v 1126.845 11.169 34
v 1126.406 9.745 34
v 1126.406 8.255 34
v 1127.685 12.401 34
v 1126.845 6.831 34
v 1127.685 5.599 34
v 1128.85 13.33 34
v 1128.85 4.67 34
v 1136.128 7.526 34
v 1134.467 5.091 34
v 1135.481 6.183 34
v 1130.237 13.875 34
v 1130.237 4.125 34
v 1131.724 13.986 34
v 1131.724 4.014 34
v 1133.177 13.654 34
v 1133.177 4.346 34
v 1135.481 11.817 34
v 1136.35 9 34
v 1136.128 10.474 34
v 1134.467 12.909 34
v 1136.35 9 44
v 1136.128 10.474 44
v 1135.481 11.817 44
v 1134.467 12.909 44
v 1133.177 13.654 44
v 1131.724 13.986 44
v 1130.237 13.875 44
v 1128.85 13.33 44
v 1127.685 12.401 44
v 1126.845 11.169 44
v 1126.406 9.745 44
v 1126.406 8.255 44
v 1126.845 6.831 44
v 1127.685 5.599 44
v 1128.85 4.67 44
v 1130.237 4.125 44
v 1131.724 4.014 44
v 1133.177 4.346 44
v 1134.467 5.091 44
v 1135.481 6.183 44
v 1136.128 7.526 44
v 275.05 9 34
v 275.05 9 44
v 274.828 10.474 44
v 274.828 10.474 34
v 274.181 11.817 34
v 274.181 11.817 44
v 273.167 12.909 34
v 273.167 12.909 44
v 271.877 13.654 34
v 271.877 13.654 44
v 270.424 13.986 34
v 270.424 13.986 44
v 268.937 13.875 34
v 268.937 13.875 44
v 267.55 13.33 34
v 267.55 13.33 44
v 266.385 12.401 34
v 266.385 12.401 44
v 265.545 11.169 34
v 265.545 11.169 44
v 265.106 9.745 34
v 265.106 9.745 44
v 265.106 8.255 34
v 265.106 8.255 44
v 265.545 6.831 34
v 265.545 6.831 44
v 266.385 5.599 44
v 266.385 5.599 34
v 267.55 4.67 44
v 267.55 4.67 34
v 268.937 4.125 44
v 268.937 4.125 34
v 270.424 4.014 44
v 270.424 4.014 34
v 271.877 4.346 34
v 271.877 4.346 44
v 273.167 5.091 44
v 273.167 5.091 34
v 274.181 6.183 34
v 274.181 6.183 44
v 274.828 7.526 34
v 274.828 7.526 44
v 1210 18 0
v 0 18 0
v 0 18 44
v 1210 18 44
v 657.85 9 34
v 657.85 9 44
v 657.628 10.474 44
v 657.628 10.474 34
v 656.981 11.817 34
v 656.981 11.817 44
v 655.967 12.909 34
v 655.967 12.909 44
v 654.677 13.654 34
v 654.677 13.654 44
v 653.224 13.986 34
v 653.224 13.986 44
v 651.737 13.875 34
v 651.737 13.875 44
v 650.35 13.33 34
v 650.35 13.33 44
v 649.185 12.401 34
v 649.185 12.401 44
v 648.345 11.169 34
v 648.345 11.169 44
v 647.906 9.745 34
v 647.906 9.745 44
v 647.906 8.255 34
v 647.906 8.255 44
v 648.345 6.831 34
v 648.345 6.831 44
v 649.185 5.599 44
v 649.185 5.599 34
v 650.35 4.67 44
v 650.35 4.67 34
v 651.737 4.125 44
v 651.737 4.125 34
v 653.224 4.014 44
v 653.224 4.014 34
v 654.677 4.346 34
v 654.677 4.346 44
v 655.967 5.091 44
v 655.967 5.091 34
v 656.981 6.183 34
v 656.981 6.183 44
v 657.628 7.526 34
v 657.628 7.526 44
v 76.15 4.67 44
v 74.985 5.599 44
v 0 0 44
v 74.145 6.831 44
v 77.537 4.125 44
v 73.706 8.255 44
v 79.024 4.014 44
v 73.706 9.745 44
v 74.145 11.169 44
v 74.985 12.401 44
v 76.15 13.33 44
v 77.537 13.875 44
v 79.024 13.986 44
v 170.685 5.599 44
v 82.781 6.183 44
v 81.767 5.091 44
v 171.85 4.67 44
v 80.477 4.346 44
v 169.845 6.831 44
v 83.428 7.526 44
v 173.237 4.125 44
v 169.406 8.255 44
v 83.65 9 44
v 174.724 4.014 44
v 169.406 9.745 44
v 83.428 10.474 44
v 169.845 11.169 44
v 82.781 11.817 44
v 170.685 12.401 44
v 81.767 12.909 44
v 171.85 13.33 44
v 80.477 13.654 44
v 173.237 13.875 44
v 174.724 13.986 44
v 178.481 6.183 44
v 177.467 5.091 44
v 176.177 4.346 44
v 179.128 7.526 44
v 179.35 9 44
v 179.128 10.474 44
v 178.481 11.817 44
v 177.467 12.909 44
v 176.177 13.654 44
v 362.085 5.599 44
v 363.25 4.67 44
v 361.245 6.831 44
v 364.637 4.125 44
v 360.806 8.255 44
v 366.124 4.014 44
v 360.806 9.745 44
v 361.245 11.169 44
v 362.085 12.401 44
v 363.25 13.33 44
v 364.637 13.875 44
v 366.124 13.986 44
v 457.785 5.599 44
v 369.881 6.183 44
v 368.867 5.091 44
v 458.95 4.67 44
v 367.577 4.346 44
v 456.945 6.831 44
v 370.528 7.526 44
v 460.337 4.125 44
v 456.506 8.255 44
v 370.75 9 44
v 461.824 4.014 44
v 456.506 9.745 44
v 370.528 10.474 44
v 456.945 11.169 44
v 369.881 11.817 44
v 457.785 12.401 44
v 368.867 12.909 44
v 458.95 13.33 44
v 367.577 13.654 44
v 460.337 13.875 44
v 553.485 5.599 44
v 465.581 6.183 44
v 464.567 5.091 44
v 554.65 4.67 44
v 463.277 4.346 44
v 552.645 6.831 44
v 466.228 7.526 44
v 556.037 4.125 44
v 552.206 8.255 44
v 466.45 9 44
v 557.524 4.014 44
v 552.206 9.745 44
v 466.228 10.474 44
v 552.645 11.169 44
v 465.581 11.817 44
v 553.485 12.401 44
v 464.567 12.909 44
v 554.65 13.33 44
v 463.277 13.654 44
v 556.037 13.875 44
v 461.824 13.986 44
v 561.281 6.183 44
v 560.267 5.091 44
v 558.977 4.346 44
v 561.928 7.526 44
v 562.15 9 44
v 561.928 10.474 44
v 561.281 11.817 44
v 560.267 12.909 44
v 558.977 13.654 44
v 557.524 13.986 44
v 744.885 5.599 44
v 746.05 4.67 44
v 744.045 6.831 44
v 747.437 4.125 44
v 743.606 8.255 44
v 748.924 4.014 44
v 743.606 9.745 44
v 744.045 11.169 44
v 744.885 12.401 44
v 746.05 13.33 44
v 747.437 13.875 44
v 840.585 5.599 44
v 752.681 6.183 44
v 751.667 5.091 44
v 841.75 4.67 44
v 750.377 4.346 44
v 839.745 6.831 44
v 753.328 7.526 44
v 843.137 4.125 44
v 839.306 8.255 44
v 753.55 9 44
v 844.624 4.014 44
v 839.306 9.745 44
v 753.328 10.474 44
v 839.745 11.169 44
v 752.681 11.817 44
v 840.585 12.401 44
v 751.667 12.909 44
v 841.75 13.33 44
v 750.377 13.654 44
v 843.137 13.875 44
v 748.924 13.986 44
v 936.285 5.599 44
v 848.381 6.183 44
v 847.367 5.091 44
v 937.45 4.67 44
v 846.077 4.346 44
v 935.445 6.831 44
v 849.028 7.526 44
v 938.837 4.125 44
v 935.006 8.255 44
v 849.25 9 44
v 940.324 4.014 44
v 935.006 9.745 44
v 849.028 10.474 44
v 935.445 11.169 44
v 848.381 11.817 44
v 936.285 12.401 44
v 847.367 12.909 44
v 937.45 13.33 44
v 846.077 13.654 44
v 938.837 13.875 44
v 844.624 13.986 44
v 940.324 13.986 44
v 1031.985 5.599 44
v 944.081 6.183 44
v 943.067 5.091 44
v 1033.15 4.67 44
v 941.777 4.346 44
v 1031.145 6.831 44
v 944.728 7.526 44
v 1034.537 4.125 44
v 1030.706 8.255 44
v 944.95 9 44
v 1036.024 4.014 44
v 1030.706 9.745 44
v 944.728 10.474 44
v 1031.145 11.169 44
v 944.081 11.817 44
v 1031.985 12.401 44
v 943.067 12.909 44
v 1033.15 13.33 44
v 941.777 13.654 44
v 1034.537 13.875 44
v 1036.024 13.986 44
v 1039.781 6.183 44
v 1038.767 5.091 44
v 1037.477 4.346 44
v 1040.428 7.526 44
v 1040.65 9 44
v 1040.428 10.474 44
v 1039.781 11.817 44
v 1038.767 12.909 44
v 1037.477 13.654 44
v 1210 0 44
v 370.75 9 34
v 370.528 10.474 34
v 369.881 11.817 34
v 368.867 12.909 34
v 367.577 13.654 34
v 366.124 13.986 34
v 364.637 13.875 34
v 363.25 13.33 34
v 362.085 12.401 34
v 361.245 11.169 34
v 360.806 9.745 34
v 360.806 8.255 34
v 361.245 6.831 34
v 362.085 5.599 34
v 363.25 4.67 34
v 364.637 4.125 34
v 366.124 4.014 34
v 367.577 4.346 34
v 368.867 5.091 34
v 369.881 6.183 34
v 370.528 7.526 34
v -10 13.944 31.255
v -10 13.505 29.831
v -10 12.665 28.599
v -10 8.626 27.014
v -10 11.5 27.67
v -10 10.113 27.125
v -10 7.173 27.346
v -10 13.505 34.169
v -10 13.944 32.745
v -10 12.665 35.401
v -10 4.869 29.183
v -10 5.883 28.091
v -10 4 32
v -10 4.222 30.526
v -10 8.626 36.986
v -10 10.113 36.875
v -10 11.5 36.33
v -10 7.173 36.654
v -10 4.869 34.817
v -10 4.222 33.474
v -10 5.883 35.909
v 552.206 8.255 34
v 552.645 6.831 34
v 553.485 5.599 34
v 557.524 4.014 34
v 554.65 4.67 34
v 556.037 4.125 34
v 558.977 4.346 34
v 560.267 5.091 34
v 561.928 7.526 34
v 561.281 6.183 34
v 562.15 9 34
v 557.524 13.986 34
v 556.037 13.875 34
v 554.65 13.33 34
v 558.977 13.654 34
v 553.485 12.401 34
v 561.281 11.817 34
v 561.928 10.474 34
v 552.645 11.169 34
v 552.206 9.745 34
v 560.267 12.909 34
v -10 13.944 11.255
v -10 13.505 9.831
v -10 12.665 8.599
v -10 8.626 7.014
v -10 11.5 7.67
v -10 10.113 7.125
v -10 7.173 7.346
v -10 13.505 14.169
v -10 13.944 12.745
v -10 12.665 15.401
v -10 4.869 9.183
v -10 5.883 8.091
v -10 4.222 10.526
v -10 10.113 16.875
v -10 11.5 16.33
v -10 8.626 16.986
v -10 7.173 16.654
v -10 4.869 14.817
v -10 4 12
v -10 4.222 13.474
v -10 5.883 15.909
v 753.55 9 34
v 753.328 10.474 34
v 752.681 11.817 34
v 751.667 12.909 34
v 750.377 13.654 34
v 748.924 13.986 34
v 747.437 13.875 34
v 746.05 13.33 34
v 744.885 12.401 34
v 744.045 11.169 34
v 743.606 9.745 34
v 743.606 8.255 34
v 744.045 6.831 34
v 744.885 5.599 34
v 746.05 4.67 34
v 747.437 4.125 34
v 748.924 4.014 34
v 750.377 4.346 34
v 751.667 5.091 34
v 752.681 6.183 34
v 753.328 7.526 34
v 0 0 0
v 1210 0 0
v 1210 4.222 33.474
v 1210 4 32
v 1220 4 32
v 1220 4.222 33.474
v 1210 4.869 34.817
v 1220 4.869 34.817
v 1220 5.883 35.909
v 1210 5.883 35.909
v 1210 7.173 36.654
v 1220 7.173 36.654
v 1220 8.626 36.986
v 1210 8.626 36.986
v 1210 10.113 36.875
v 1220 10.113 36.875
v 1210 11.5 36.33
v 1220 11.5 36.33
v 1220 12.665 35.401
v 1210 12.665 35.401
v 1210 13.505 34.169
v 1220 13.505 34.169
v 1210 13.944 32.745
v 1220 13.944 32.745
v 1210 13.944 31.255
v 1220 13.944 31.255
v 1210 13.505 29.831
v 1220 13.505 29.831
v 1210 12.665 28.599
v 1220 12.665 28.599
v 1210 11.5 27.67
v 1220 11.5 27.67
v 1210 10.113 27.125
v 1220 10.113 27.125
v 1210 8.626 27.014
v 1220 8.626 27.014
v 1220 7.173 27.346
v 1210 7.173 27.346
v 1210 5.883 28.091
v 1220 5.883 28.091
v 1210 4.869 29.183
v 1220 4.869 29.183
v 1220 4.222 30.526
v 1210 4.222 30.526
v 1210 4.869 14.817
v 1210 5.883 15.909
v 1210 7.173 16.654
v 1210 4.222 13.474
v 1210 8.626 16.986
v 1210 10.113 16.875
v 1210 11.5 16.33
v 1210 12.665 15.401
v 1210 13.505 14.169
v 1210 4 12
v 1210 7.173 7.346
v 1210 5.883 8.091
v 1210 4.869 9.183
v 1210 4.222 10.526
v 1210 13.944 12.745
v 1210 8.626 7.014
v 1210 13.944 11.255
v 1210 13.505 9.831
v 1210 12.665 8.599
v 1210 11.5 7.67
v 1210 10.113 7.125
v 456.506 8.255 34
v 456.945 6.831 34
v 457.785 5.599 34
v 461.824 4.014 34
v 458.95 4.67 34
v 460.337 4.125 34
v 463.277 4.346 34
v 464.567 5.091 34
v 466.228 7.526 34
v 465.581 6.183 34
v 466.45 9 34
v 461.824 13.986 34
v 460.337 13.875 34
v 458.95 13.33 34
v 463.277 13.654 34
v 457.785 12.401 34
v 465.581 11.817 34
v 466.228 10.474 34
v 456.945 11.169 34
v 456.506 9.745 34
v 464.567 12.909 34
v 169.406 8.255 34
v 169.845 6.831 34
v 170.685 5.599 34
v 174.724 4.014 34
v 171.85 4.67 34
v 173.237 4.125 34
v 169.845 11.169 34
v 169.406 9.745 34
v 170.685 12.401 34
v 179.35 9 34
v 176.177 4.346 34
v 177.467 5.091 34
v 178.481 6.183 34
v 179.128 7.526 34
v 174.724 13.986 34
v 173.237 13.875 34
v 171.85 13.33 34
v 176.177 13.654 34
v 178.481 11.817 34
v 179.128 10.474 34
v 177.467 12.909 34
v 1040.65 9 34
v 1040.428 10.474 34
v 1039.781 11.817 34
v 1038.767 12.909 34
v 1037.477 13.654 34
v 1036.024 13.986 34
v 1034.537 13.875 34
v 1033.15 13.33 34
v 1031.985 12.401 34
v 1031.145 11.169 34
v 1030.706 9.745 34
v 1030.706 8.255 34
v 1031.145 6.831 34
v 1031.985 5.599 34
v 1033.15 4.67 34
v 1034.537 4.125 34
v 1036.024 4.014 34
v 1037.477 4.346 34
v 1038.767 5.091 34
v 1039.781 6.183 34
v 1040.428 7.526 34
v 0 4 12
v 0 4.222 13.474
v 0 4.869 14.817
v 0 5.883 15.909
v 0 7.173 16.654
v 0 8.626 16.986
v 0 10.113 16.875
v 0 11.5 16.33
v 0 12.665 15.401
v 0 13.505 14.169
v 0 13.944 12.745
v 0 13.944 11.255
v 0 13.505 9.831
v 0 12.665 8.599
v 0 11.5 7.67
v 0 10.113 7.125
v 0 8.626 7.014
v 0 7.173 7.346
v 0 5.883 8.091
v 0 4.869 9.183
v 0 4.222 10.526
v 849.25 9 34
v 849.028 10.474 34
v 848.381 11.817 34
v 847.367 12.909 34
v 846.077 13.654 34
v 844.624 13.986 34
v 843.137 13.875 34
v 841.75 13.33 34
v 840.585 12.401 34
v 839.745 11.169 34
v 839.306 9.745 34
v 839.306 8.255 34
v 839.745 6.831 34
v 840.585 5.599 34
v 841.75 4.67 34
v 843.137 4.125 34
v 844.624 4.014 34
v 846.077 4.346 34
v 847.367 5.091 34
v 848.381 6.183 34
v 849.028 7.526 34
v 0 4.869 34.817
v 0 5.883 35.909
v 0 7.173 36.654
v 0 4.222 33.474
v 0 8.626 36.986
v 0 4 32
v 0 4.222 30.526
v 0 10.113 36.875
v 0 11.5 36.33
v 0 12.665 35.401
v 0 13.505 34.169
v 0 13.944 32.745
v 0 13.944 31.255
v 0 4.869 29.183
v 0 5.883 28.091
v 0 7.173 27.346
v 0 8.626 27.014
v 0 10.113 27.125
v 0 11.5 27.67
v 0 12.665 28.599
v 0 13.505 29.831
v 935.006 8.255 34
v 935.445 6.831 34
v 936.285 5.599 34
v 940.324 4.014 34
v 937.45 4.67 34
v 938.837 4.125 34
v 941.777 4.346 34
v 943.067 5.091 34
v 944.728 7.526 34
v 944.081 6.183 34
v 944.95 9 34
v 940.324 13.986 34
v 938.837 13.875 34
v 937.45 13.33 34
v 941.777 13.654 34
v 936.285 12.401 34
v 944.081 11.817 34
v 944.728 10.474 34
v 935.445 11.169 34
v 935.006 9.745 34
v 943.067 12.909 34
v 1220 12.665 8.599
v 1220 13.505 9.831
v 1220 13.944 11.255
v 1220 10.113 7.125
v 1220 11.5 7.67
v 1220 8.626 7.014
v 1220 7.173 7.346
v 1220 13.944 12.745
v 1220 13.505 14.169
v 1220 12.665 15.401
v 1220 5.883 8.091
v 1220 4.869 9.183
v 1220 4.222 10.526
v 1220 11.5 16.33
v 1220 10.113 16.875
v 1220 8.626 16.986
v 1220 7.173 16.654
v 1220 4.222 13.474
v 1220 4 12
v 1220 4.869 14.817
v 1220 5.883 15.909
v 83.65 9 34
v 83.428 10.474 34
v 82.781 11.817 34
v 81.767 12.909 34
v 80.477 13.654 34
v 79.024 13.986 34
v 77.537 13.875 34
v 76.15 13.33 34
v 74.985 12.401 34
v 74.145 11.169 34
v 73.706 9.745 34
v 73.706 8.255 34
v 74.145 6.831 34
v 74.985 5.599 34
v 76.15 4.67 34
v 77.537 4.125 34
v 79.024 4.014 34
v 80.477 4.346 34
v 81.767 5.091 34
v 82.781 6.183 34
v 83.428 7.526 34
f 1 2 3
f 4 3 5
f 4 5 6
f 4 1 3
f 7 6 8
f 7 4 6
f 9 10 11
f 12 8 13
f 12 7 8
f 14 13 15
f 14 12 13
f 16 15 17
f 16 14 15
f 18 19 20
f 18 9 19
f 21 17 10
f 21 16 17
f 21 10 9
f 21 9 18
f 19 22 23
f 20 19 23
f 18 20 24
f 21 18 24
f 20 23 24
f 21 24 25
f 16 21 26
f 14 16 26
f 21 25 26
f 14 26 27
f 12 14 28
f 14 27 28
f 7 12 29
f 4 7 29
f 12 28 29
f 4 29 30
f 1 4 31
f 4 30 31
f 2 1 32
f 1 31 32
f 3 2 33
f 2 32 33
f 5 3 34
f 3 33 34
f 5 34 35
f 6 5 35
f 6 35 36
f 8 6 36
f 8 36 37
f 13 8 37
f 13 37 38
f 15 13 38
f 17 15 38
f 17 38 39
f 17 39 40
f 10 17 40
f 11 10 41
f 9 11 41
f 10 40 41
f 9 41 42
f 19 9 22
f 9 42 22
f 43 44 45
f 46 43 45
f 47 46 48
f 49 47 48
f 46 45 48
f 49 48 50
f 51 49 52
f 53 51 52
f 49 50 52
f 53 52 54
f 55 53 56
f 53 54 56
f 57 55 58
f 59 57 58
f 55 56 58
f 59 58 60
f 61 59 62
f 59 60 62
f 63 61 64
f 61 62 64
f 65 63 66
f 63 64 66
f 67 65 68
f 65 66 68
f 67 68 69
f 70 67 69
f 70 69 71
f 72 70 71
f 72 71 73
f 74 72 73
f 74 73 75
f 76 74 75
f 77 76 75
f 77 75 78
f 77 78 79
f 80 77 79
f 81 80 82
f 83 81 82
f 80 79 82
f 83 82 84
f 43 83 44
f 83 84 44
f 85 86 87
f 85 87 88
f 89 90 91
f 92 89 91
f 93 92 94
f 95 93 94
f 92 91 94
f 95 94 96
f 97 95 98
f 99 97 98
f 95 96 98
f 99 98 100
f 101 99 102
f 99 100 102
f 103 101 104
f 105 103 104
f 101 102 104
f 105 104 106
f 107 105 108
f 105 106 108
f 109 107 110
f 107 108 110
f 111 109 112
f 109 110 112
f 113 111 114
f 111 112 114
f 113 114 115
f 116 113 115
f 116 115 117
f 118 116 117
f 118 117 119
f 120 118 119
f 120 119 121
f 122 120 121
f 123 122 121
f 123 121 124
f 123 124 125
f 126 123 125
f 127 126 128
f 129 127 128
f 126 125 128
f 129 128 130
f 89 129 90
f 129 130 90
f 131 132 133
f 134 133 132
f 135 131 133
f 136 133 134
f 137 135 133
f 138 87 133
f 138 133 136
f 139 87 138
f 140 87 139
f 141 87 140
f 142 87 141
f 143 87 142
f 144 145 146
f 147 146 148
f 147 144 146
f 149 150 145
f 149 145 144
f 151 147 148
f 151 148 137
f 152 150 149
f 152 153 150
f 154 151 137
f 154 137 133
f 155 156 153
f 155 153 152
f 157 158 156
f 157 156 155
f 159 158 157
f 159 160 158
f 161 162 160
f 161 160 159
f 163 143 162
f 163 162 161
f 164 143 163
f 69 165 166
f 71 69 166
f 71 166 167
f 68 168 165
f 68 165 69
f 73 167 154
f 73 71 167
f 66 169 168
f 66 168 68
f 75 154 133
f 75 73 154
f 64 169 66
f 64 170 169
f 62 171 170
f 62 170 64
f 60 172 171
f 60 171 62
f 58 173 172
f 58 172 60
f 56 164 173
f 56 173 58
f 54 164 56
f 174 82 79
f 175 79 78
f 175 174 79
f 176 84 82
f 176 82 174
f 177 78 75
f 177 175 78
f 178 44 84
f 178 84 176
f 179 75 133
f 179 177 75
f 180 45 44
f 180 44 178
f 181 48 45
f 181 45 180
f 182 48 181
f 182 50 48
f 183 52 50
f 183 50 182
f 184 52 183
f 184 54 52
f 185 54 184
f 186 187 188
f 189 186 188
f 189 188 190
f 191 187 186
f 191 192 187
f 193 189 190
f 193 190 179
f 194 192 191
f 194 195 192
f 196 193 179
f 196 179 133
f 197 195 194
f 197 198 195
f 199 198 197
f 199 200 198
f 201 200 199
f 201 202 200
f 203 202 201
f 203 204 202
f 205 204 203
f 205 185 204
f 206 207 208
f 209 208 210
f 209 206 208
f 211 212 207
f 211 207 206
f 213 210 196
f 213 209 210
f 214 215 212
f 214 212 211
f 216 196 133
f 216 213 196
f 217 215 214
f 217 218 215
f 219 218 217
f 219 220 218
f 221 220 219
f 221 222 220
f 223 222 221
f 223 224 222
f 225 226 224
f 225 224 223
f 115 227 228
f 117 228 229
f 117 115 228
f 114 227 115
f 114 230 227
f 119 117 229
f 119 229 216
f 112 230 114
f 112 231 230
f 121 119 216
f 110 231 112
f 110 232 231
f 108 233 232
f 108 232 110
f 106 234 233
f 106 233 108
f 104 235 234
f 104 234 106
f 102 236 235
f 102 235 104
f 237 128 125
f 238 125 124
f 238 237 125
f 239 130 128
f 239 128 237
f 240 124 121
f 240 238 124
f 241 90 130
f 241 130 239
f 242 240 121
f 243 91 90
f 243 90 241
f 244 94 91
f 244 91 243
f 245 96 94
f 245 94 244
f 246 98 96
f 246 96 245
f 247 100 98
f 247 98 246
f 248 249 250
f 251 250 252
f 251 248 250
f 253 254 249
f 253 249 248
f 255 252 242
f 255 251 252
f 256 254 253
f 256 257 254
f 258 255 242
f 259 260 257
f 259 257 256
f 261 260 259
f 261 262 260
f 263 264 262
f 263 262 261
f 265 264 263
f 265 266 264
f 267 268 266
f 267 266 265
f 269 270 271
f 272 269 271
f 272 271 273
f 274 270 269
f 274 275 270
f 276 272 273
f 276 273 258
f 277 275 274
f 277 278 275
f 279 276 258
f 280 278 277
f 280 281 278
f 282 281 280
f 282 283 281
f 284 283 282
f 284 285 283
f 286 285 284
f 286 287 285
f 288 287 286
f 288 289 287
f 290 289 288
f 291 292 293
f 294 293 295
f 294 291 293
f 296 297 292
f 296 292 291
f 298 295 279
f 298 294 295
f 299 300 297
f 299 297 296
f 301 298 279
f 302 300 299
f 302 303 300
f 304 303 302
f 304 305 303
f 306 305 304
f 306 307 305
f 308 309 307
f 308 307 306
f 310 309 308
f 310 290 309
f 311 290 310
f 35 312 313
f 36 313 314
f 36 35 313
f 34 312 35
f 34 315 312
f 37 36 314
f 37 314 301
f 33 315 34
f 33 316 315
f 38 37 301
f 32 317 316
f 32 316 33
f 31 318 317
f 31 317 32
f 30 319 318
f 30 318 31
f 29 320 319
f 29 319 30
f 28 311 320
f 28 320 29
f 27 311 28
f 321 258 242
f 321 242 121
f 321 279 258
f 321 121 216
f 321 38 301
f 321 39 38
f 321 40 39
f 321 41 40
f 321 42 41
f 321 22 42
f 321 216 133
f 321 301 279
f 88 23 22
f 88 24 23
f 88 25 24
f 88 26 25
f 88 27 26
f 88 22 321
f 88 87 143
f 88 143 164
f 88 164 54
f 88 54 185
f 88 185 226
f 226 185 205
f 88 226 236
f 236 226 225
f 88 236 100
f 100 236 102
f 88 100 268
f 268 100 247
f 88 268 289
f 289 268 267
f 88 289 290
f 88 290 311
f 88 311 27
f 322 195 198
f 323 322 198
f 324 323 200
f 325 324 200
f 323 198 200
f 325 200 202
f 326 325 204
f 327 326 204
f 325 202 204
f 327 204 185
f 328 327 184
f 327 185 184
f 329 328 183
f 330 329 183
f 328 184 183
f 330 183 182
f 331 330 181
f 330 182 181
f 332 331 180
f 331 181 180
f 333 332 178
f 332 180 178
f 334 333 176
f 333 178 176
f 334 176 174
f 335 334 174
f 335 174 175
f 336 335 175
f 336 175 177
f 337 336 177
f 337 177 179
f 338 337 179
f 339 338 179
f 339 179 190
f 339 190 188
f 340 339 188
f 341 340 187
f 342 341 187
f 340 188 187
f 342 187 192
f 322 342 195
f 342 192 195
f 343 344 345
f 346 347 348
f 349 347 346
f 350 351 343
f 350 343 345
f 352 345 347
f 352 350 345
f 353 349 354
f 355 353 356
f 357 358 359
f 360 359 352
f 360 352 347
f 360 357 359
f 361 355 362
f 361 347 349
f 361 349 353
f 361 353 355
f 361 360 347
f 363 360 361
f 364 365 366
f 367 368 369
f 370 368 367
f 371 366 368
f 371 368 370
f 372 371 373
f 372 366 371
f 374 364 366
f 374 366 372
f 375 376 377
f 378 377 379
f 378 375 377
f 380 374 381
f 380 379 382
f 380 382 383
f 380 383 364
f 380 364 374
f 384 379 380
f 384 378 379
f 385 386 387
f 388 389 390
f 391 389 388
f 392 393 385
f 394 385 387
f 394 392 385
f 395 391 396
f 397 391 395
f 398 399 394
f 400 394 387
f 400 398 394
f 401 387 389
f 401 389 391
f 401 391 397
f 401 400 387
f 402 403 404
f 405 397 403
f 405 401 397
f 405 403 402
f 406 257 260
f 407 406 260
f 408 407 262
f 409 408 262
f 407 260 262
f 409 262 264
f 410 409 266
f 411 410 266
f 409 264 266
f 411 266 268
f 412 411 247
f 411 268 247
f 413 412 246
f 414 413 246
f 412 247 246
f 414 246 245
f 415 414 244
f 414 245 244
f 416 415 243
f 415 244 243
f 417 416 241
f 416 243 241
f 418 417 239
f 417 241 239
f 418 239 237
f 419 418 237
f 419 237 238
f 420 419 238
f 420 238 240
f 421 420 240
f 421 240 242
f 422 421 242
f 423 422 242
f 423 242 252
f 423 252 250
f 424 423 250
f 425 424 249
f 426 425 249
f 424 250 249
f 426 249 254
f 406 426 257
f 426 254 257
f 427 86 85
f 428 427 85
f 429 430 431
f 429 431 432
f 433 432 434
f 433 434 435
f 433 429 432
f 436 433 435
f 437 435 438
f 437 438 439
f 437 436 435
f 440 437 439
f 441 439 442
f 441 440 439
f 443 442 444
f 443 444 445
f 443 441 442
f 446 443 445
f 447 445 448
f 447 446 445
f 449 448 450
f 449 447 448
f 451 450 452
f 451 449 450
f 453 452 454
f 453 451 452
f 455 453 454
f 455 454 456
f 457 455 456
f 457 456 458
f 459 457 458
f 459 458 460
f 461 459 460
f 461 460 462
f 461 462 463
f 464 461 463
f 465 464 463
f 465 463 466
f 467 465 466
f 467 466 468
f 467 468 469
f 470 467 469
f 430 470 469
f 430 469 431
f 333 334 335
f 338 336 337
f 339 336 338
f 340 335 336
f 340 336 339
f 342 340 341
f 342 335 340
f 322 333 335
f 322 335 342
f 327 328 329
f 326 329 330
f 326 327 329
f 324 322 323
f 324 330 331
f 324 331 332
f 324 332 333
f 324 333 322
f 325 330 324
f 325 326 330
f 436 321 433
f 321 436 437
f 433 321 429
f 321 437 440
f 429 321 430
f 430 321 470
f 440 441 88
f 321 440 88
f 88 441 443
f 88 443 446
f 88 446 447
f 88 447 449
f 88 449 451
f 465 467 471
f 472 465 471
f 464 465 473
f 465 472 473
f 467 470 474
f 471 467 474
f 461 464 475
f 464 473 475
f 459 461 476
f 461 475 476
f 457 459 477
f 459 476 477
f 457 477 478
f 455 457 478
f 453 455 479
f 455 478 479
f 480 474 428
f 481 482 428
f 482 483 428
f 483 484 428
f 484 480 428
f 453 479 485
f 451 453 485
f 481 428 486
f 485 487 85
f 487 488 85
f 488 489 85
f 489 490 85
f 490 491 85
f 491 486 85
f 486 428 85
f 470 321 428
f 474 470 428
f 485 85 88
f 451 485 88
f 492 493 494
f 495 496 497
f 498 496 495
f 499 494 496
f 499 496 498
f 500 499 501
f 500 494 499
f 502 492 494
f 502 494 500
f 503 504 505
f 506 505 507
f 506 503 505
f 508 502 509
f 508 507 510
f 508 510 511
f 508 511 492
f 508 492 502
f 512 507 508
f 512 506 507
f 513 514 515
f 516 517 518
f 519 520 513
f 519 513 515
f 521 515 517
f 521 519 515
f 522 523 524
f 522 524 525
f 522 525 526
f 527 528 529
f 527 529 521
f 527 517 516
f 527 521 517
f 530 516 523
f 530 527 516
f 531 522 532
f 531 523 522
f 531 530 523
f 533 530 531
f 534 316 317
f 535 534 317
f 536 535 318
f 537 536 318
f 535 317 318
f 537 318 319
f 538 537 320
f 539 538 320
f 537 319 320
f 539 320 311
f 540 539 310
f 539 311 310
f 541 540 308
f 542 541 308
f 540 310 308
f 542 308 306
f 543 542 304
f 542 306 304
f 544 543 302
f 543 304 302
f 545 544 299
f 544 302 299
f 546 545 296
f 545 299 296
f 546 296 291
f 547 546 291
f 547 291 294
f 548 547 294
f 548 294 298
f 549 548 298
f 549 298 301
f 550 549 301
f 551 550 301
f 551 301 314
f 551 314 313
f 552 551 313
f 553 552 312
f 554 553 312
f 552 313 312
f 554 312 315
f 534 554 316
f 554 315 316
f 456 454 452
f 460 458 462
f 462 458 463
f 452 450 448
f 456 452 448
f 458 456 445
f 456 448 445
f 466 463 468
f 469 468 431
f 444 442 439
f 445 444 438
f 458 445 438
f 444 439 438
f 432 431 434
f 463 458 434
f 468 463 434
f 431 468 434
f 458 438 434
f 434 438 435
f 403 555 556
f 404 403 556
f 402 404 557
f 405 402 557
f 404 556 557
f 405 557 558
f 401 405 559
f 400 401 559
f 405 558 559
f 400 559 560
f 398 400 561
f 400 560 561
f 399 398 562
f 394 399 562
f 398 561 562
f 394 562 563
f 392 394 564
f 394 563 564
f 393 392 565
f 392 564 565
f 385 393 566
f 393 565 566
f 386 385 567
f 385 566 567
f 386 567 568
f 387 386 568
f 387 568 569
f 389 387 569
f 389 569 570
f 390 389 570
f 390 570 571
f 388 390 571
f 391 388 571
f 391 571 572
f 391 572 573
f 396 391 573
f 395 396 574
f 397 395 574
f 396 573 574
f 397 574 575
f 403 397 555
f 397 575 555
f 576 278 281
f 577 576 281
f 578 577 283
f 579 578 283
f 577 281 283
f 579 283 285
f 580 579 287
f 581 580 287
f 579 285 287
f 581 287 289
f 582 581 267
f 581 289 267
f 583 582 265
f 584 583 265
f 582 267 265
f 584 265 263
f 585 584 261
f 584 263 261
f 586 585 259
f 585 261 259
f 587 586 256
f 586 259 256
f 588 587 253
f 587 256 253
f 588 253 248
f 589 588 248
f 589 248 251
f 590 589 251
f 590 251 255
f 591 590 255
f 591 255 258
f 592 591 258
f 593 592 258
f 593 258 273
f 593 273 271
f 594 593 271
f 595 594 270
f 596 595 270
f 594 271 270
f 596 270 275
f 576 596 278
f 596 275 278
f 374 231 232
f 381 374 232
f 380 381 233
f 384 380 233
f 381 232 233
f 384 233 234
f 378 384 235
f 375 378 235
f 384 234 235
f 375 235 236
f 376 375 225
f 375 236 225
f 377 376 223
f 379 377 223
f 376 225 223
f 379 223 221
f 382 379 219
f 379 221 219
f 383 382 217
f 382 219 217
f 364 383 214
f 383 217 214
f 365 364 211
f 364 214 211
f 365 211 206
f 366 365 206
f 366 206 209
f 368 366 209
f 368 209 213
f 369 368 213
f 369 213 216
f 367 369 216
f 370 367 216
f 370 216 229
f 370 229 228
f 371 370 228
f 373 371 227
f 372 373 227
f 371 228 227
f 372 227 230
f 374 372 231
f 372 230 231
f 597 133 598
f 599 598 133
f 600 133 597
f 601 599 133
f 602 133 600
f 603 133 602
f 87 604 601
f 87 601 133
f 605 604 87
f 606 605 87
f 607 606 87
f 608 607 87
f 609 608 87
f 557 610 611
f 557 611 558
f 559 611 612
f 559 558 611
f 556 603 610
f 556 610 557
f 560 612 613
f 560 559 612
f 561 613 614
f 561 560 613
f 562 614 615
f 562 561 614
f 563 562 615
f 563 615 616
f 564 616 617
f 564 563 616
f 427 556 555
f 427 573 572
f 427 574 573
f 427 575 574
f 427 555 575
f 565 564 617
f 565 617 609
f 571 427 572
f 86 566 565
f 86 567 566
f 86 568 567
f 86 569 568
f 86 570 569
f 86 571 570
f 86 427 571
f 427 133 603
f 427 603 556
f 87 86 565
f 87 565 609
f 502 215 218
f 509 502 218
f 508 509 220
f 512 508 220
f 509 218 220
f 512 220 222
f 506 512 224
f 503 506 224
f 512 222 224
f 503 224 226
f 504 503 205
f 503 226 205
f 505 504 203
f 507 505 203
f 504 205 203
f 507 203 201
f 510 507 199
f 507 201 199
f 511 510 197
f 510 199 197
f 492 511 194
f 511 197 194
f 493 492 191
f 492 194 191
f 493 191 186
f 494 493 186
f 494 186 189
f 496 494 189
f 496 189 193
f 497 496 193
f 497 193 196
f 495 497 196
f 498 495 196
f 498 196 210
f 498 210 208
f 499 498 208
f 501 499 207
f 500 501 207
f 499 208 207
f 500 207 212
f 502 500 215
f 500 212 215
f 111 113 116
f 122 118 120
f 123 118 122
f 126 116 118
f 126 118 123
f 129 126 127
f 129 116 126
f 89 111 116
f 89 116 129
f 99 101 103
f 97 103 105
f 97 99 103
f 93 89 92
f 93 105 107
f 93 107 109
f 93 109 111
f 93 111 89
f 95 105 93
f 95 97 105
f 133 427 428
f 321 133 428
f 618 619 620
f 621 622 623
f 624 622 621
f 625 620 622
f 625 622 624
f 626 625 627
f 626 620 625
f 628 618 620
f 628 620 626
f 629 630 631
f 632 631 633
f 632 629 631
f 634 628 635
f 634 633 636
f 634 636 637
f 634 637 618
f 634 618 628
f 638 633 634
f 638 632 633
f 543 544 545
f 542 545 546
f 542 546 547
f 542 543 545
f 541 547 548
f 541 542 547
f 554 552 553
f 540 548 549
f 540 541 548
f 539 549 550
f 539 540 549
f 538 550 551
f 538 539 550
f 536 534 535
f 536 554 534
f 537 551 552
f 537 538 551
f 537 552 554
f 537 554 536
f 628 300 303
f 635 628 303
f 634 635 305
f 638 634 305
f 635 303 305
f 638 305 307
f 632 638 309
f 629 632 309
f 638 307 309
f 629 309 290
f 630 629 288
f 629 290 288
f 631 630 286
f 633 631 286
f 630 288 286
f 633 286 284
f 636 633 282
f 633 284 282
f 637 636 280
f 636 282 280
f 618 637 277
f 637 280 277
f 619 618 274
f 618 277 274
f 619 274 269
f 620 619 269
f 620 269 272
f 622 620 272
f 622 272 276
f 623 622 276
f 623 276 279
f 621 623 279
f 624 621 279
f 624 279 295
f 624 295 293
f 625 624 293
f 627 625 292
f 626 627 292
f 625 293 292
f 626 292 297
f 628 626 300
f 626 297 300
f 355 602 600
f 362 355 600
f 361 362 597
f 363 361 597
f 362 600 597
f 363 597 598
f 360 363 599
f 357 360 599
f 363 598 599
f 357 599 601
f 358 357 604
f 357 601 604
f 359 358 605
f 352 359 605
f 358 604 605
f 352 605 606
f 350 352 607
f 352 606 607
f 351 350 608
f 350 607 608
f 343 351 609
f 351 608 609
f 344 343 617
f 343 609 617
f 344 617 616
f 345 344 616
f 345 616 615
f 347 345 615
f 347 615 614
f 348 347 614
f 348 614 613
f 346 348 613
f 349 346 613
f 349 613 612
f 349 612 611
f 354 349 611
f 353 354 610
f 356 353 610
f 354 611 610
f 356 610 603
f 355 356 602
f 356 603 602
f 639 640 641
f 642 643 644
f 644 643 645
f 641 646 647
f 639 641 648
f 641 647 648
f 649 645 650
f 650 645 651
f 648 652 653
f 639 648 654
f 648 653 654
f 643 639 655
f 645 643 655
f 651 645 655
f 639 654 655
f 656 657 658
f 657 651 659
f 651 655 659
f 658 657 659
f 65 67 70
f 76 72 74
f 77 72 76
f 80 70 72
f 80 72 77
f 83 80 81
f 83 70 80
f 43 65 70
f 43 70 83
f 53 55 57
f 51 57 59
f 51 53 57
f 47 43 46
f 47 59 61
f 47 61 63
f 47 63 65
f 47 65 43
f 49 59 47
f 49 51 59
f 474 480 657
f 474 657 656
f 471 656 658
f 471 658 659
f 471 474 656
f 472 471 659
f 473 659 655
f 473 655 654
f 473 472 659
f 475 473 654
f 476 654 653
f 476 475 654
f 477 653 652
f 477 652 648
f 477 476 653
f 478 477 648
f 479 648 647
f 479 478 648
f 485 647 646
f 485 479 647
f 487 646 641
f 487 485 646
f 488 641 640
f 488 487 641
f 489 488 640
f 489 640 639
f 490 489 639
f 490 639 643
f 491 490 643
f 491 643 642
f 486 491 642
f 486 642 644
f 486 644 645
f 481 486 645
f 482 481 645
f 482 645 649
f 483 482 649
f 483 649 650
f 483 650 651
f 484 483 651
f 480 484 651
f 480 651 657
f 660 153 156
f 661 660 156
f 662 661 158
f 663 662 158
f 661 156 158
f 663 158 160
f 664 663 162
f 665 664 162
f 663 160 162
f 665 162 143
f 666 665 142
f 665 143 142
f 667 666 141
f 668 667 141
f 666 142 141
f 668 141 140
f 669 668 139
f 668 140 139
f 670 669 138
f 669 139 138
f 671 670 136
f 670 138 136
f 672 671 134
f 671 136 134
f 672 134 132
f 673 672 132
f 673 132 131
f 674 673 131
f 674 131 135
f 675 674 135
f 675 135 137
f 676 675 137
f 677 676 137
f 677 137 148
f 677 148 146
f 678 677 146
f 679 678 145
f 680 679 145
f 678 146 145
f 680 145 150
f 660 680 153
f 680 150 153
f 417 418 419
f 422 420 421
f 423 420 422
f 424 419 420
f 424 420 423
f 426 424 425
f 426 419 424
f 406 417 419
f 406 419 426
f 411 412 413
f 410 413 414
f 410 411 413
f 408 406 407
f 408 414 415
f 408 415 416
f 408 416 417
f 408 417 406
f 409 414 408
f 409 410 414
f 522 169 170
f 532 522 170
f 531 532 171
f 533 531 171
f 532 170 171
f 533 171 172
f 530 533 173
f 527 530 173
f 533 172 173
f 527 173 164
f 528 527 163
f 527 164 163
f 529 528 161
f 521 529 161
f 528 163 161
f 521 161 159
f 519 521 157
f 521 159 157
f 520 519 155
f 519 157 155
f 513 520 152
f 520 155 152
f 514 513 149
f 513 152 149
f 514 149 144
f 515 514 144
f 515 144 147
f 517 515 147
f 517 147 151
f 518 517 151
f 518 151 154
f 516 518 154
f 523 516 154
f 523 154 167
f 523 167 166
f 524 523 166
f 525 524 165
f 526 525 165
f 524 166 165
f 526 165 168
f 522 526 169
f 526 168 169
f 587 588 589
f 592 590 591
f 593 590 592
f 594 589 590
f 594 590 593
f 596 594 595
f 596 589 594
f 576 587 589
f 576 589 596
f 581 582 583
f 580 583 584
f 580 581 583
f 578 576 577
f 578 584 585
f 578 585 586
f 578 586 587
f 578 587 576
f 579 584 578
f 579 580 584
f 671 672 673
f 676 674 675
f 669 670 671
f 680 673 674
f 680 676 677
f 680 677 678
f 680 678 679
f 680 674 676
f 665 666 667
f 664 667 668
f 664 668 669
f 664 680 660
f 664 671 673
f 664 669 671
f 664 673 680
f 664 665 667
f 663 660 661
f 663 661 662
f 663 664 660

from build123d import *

# Parameters (mm, degrees)
F0_W          = 1210
F0_H          = 18
F1_DEPTH      = 44
F2_R          = 5
F3_DEPTH      = 10
F3_DEPTH_BACK = 1220
F4_R          = 5
F5_DEPTH      = 10


# Not quite as in the source:
# - a feature names something its author has since deleted; it is built from what else it names


with BuildPart() as f1:
    # F0 (on Top) → F1 (new body)
    with BuildSketch(Plane.XY):
        with Locations((605, 9)):
            Rectangle(F0_W, F0_H)
    extrude(amount=F1_DEPTH)

    # F2 (on face) → F3 (join, two sides)
    with BuildSketch(Plane(origin=(0, 0, 0), x_dir=(0, -1, 0), z_dir=(-1, 0, 0))) as f3_sk:
        with Locations((-9, 32)):
            Circle(F2_R)
        with Locations((-9, 12)):
            Circle(F2_R)
    extrude(amount=F3_DEPTH)
    extrude(f3_sk.sketch, amount=-F3_DEPTH_BACK)

    # F4 (on face) → F5 (cut)
    with BuildSketch(Plane.XY.offset(44)):
        with Locations((78.65, 9)):
            Circle(F4_R)
        with Locations((174.35, 9)):
            Circle(F4_R)
        with Locations((270.05, 9)):
            Circle(F4_R)
        with Locations((365.75, 9)):
            Circle(F4_R)
        with Locations((461.45, 9)):
            Circle(F4_R)
        with Locations((557.15, 9)):
            Circle(F4_R)
        with Locations((652.85, 9)):
            Circle(F4_R)
        with Locations((748.55, 9)):
            Circle(F4_R)
        with Locations((844.25, 9)):
            Circle(F4_R)
        with Locations((939.95, 9)):
            Circle(F4_R)
        with Locations((1035.65, 9)):
            Circle(F4_R)
        with Locations((1131.35, 9)):
            Circle(F4_R)
    extrude(amount=-F5_DEPTH, mode=Mode.SUBTRACT)


solid = f1.part
